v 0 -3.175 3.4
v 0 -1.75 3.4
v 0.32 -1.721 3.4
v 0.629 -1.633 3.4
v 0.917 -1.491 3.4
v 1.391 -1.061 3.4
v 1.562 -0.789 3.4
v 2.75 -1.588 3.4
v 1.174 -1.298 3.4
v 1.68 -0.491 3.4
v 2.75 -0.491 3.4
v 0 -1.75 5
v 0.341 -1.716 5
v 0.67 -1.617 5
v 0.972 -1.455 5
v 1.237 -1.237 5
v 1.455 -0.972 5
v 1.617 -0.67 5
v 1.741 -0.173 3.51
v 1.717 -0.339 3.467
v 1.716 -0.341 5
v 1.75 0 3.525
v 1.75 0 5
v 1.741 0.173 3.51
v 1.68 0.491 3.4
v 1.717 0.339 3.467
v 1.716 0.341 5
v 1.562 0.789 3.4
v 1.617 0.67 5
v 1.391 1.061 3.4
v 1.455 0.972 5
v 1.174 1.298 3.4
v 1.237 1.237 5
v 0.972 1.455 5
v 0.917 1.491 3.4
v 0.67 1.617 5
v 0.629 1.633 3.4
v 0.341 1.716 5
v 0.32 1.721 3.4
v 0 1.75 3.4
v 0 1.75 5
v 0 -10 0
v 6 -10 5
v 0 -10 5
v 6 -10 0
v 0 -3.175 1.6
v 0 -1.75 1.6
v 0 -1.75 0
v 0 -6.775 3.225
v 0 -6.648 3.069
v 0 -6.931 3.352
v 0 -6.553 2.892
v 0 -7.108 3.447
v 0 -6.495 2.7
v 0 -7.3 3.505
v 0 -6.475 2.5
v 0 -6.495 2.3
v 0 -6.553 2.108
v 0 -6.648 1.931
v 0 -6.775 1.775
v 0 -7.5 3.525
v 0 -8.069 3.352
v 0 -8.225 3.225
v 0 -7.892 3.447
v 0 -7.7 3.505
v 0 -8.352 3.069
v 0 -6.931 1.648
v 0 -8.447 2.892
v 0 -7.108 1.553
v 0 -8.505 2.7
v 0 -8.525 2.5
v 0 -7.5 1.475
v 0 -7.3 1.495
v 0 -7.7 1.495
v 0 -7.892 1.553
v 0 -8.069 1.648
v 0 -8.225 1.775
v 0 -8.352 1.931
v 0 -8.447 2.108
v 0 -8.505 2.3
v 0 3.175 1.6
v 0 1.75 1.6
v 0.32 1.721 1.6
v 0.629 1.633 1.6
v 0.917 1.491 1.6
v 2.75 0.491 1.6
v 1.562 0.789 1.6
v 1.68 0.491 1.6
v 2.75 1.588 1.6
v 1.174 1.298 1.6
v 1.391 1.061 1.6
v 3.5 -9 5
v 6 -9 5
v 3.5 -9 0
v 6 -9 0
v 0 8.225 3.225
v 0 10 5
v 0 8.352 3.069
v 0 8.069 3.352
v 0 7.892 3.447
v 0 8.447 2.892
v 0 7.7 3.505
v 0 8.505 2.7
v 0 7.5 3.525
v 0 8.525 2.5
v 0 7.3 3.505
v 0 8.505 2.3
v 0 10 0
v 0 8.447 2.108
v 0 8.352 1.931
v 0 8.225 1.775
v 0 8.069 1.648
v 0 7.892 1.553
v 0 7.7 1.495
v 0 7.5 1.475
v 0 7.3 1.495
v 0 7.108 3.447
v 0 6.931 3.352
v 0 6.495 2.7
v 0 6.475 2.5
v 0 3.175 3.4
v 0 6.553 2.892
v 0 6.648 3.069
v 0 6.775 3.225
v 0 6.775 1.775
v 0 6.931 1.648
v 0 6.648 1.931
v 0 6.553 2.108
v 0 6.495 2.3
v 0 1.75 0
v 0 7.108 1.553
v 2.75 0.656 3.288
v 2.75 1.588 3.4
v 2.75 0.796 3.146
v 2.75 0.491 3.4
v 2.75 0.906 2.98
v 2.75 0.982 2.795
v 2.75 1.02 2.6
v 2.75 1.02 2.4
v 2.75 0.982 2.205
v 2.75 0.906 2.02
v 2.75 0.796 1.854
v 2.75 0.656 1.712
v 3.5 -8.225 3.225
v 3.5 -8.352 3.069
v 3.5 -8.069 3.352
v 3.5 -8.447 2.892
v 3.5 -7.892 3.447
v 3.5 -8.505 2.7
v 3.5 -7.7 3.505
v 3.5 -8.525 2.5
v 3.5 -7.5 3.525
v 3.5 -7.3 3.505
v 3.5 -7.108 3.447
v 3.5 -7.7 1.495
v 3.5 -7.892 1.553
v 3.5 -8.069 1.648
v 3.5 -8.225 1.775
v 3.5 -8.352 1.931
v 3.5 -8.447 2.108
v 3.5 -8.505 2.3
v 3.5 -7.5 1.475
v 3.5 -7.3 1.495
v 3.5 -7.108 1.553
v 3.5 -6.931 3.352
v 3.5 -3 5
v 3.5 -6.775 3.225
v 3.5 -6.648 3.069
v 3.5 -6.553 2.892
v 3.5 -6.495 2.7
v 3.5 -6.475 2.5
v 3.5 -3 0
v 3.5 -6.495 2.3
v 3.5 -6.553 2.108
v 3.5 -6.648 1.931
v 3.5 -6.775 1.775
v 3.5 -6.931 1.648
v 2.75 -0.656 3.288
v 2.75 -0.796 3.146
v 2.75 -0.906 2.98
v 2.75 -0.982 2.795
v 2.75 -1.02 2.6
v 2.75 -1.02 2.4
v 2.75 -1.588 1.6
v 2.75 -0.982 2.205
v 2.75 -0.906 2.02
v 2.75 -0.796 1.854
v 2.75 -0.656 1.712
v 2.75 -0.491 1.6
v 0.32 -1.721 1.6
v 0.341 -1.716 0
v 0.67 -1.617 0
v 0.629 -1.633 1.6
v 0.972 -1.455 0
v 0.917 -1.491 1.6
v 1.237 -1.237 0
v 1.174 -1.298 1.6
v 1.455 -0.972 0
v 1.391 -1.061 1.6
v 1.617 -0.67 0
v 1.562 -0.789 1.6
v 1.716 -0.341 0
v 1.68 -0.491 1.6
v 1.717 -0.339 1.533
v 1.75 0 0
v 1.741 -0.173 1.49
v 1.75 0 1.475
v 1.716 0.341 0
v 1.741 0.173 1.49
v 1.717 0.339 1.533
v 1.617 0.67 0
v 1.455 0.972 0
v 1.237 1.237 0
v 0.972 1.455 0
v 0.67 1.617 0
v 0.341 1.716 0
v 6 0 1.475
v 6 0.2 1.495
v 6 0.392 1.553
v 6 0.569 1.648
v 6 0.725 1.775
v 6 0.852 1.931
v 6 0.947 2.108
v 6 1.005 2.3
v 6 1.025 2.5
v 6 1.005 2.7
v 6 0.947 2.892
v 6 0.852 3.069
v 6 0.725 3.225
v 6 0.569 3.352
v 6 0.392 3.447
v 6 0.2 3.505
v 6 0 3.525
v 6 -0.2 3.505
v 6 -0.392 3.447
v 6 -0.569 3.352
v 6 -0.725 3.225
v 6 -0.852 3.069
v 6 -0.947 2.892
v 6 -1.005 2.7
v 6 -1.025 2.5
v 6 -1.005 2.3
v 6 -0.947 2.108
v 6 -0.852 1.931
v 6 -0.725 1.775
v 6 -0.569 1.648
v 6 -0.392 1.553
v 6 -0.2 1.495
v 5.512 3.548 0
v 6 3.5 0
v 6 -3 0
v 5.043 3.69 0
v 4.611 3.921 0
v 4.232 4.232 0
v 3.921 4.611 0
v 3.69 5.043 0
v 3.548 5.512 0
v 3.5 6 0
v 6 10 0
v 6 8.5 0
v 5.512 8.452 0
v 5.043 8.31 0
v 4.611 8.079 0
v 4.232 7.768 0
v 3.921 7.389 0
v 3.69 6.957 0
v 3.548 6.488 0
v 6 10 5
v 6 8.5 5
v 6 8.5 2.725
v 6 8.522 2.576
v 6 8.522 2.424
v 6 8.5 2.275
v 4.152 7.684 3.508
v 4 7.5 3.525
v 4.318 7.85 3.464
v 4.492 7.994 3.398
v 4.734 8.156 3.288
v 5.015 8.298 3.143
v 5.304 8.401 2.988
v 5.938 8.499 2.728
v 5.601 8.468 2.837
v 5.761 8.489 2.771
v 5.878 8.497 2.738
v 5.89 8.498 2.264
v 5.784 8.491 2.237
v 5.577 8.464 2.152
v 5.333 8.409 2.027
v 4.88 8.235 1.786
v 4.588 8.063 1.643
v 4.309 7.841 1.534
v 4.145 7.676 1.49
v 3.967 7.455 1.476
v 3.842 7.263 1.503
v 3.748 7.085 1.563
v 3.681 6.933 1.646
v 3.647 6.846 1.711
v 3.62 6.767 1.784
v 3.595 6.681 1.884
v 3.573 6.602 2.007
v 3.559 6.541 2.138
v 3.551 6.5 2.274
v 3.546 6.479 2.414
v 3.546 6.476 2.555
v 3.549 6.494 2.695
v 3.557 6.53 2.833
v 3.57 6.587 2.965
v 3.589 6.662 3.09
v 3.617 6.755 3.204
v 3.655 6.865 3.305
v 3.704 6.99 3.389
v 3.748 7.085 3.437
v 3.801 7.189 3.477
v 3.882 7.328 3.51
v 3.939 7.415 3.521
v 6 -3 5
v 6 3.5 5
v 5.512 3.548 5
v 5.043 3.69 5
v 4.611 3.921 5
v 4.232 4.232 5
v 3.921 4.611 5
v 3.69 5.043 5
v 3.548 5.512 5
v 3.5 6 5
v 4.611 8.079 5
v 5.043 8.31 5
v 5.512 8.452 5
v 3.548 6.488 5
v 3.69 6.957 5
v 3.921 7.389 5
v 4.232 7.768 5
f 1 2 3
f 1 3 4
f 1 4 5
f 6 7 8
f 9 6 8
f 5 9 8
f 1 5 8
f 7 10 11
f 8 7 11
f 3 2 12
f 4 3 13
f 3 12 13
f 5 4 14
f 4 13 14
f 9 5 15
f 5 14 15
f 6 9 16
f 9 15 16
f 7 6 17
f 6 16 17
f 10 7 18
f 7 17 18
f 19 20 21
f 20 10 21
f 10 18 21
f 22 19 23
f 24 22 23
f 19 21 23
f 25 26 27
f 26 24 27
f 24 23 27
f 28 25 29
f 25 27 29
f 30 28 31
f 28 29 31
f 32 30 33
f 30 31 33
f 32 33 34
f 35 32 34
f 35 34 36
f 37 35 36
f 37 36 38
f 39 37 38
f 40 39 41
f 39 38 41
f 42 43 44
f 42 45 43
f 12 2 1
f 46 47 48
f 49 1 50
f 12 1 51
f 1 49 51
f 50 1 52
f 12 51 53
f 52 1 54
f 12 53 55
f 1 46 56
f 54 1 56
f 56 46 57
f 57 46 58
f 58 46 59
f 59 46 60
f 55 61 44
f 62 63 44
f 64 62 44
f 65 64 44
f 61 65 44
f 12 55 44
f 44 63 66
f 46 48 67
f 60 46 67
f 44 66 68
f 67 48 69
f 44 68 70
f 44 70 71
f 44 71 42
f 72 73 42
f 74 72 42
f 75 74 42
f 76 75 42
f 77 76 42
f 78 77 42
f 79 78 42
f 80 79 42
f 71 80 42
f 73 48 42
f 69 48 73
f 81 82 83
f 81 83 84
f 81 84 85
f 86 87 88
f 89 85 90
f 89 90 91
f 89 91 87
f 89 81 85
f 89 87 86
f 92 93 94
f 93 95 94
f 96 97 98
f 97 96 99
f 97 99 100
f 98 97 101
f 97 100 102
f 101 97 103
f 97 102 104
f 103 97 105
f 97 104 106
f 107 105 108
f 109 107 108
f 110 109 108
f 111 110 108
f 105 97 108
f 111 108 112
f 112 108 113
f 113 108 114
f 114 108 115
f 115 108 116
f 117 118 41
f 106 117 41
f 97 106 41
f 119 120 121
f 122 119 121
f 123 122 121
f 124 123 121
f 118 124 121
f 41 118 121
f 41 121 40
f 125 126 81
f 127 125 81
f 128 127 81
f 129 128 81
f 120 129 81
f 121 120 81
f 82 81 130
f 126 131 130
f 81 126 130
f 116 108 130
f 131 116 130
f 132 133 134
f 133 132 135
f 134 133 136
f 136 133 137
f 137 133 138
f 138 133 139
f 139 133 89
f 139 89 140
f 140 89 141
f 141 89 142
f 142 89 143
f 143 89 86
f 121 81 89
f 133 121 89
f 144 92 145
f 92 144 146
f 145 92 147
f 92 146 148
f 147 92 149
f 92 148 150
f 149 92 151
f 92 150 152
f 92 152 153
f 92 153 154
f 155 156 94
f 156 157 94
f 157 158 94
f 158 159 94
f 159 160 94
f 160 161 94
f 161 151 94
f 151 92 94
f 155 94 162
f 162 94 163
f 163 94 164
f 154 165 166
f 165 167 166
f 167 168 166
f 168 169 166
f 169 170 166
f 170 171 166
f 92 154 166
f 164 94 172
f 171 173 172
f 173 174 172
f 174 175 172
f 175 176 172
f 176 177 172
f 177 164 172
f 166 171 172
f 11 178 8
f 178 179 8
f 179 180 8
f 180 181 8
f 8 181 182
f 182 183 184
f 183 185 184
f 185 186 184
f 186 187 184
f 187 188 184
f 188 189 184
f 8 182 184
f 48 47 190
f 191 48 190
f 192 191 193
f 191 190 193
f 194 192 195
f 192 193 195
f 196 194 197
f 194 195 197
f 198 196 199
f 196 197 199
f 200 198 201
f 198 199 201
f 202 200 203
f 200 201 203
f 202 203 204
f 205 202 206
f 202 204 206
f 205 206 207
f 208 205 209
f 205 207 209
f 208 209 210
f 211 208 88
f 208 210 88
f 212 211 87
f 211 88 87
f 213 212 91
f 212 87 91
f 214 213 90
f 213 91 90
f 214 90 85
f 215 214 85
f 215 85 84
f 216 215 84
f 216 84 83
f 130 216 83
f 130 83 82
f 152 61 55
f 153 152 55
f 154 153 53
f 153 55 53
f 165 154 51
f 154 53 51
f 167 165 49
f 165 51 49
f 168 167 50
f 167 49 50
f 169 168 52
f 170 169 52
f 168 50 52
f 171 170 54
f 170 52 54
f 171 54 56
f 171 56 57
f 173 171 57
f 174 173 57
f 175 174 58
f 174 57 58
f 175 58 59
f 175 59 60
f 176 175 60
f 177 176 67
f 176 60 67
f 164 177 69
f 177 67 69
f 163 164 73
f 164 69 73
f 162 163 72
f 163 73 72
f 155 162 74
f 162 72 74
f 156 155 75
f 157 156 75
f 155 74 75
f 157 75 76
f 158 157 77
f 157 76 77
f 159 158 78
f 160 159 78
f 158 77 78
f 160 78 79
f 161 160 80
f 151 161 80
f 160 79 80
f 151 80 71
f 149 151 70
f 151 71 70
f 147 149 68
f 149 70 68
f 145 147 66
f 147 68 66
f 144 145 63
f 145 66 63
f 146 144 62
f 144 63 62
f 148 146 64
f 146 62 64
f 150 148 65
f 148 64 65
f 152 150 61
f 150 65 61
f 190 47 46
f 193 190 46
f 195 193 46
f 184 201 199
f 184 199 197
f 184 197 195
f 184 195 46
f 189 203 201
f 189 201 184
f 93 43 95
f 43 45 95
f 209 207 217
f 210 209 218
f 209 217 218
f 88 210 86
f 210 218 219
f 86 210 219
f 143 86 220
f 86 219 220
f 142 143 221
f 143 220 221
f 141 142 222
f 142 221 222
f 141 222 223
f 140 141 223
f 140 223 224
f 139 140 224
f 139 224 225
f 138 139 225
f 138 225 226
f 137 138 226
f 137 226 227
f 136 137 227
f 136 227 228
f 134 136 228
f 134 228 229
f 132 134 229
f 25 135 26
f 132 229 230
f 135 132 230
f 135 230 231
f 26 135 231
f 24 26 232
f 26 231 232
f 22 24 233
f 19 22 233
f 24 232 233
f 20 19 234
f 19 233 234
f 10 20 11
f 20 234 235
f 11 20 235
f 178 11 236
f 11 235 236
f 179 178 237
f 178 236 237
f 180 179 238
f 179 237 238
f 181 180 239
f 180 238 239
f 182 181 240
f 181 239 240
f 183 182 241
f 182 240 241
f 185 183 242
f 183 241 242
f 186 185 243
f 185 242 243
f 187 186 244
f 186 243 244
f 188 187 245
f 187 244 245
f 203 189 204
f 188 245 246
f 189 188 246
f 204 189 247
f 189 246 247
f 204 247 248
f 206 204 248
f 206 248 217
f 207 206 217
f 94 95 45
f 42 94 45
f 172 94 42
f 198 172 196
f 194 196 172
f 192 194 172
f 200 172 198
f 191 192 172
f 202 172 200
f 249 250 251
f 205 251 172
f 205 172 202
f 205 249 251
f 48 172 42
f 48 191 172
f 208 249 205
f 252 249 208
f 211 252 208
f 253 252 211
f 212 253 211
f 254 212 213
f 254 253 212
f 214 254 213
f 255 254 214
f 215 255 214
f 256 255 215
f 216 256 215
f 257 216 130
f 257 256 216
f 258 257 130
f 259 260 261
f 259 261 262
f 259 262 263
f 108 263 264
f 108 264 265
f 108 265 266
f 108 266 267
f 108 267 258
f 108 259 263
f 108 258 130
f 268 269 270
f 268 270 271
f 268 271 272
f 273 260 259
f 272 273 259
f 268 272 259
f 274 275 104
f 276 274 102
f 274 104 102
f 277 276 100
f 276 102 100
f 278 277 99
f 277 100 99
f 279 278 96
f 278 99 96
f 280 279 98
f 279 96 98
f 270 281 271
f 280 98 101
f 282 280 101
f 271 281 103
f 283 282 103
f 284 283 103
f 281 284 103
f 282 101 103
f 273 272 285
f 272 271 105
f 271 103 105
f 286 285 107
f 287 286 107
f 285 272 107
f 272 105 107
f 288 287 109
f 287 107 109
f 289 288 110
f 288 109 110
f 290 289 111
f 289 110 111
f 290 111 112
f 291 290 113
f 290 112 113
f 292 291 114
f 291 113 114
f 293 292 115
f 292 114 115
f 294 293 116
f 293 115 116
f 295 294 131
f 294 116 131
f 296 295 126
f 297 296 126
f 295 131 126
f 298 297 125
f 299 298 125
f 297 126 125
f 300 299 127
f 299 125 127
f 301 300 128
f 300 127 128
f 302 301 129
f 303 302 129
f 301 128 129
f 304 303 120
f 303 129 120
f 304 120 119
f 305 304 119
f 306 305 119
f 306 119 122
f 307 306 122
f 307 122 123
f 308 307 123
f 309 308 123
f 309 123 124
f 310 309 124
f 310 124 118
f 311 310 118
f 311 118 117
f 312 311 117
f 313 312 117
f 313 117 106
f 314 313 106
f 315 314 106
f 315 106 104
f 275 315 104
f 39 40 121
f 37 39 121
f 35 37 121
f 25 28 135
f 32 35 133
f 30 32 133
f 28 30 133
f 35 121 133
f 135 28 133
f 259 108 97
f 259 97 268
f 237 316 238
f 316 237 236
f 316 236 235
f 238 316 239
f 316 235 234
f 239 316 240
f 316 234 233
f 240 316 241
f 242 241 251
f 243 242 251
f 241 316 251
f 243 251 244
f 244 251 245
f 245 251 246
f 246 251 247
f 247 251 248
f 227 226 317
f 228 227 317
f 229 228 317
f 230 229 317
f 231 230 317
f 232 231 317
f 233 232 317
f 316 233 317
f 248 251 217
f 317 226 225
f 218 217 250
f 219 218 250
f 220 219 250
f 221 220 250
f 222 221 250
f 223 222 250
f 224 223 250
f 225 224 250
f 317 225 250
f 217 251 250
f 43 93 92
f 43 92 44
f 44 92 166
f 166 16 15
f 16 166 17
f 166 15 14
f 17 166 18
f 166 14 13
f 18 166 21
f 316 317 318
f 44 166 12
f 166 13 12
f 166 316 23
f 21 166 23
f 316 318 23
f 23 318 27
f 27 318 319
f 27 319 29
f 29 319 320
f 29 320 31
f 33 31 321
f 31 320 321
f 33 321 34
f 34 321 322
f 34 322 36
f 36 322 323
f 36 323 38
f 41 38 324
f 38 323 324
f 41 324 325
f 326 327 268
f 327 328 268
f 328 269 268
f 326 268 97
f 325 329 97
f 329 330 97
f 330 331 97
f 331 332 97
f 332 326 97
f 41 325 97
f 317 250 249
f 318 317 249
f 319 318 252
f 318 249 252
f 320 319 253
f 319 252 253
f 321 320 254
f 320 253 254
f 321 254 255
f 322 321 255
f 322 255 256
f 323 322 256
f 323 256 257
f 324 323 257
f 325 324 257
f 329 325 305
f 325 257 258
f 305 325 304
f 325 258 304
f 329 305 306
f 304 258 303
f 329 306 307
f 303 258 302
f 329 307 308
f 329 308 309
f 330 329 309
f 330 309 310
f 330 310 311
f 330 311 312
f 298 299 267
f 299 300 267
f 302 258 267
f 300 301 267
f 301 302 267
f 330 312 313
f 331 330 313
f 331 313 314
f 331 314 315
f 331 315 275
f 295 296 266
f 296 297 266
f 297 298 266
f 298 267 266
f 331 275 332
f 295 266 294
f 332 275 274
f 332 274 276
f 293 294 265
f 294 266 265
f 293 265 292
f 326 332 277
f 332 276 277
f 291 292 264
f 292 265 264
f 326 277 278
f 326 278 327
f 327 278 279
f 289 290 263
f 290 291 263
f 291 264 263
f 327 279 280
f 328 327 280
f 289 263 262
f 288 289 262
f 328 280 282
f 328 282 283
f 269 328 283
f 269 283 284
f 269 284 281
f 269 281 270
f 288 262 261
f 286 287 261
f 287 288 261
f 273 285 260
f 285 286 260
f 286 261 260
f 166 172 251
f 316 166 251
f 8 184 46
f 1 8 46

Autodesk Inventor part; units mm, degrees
ref_plane "YZ Plane" through (0, 0, 0) normal (1, 0, 0) x (0, 1, 0)
ref_plane "XZ Plane" through (0, 0, 0) normal (0, 1, 0) x (-1, 0, 0)
sketch "Sketch1" plane through (0, 0, 0) normal (0, 0, 1) x (1, 0, 0)
  line L0 (10, -10) -> (-10, -10)
  line L1 (-10, -10) -> (-10, 10)
  line L2 (-10, 10) -> (10, 10)
  line L3 (10, 10) -> (10, -10)
  line L4 (10, -10) -> (-10, 10) construction
  line L5 (-10, -10) -> (10, 10) construction
  line L6 (10, -10) -> (6, -10)
  line L7 (6, -10) -> (6, 10)
  line L8 (6, 10) -> (10, 10)
  line L9 (10, 10) -> (10, -10)
  line L10 (6, 2) -> (4, 2)
  line L11 (4, 2) -> (4, -2)
  line L12 (4, -2) -> (6, -2)
  line L13 (6, -2) -> (6, 2)
  line L14 (0, 10) -> (0, -10)
  point P0 (0, 0)
  dimension "d0" = 20
  dimension "d1" = 20
  dimension "d2" = 4
  dimension "d6" = 2
  dimension "d7" = 2
  dimension "d8" = 4
  dimension "d9" = 2
extrude "Extrusion1" add sketch "Sketch1" along normal blind 5 contours L0 L14 L2 L7 L10 L11 L12
ref_plane "Work Plane1" through (0, 0, 2.5) normal (0, 0, 1) x (1, 0, 0)
sketch "Sketch2" plane through (0, 0, 2.5) normal (0, 0, 1) x (1, 0, 0)
  line L0 (0, 10) -> (0, -10) projected
  line L1 (0, 3.1754) -> (2.75, 1.5877)
  line L2 (2.75, 1.5877) -> (2.75, -1.5877)
  line L3 (2.75, -1.5877) -> (0, -3.1754)
  line L4 (0, -3.1754) -> (-2.75, -1.5877)
  line L5 (-2.75, -1.5877) -> (-2.75, 1.5877)
  line L6 (-2.75, 1.5877) -> (0, 3.1754)
  point P0 (0, 0)
  point P1 (0, 0)
  dimension "d12" = 5.5
extrude "Extrusion2" cut sketch "Sketch2" along normal mid plane 1.8
sketch "Sketch3" plane through (0, 0, 5) normal (0, 0, 1) x (1, 0, 0)
  circle A0 centre (0, 0) radius 1.75
  dimension "d15" = 3.5
extrude "Extrusion3" cut sketch "Sketch3" against normal blind 8
sketch "Sketch4" plane through (0, 10, 0) normal (-1, 0, 0) x (0, 0, 1)
  circle A0 centre (2.5, -2.5) radius 1.025
  circle A1 centre (2.5, -17.5) radius 1.025
  line L0 (0, 0) -> (5, 0) projected
  line L1 (0, 0) -> (0, -8.25) projected
  line L2 (0, -11.75) -> (0, -20) projected
  line L3 (0, -20) -> (5, -20) projected
  point P0 (0, -10)
  dimension "d18" = 2.05
  dimension "d19" = 2.05
  dimension "d20" = 2.5
  dimension "d21" = 2.5
  dimension "d22" = 2.5
  dimension "d23" = 2.5
extrude "Extrusion4" cut sketch "Sketch4" against normal blind 25
sketch "Sketch5" plane through (0, 0, 0) normal (0, 0, -1) x (-1, 0, 0)
  line L0 (-6, -2) -> (-4, -2) projected
  line L1 (-4, -2) -> (-6, -2)
  line L2 (-6, -2) -> (-6, 2)
  line L3 (-6, 2) -> (-4, 2)
  line L4 (-4, 2) -> (-4, -2)
  point P0 (0, 0)
extrude "Extrusion5" add sketch "Sketch5" against normal blind 5
sketch "Sketch6" plane through (0, 0, 0) normal (0, 0, -1) x (-1, 0, 0)
  line L0 (-6, -10) -> (-6, 10) projected
  circle A0 centre (-6, 6) radius 2.5
  line L1 (-6, -9) -> (-3.5, -9)
  line L2 (-3.5, -9) -> (-3.5, -3)
  line L3 (-3.5, -3) -> (-6, -3)
  line L4 (-6, -3) -> (-6, -9)
  line L5 (0, -10) -> (-6, -10) projected
  line L6 (-6, 10) -> (0, 10) projected
  point P0 (0, 0)
  dimension "d32" = 2.5
  dimension "d33" = 1
  dimension "d34" = 6
  dimension "d35" = 5
  dimension "d36" = 4
extrude "Extrusion6" cut sketch "Sketch6" against normal blind 5
sketch "Sketch7" plane through (6, -3, 0) normal (1, 0, 0) x (0, 0, -1)
  circle A0 centre (-2.5, 3) radius 1.025
  line L0 (0, 0) -> (0, 6.5) projected
  line L1 (0, -7) -> (-5, -7) projected
  point P0 (0, 3)
  dimension "d39" = 2.5
  dimension "d40" = 10
  dimension "d41" = 2.05
extrude "Extrusion7" cut sketch "Sketch7" against normal blind 20
equation "\"d19\" = d18"
properties part number "POMSliderMotor"
